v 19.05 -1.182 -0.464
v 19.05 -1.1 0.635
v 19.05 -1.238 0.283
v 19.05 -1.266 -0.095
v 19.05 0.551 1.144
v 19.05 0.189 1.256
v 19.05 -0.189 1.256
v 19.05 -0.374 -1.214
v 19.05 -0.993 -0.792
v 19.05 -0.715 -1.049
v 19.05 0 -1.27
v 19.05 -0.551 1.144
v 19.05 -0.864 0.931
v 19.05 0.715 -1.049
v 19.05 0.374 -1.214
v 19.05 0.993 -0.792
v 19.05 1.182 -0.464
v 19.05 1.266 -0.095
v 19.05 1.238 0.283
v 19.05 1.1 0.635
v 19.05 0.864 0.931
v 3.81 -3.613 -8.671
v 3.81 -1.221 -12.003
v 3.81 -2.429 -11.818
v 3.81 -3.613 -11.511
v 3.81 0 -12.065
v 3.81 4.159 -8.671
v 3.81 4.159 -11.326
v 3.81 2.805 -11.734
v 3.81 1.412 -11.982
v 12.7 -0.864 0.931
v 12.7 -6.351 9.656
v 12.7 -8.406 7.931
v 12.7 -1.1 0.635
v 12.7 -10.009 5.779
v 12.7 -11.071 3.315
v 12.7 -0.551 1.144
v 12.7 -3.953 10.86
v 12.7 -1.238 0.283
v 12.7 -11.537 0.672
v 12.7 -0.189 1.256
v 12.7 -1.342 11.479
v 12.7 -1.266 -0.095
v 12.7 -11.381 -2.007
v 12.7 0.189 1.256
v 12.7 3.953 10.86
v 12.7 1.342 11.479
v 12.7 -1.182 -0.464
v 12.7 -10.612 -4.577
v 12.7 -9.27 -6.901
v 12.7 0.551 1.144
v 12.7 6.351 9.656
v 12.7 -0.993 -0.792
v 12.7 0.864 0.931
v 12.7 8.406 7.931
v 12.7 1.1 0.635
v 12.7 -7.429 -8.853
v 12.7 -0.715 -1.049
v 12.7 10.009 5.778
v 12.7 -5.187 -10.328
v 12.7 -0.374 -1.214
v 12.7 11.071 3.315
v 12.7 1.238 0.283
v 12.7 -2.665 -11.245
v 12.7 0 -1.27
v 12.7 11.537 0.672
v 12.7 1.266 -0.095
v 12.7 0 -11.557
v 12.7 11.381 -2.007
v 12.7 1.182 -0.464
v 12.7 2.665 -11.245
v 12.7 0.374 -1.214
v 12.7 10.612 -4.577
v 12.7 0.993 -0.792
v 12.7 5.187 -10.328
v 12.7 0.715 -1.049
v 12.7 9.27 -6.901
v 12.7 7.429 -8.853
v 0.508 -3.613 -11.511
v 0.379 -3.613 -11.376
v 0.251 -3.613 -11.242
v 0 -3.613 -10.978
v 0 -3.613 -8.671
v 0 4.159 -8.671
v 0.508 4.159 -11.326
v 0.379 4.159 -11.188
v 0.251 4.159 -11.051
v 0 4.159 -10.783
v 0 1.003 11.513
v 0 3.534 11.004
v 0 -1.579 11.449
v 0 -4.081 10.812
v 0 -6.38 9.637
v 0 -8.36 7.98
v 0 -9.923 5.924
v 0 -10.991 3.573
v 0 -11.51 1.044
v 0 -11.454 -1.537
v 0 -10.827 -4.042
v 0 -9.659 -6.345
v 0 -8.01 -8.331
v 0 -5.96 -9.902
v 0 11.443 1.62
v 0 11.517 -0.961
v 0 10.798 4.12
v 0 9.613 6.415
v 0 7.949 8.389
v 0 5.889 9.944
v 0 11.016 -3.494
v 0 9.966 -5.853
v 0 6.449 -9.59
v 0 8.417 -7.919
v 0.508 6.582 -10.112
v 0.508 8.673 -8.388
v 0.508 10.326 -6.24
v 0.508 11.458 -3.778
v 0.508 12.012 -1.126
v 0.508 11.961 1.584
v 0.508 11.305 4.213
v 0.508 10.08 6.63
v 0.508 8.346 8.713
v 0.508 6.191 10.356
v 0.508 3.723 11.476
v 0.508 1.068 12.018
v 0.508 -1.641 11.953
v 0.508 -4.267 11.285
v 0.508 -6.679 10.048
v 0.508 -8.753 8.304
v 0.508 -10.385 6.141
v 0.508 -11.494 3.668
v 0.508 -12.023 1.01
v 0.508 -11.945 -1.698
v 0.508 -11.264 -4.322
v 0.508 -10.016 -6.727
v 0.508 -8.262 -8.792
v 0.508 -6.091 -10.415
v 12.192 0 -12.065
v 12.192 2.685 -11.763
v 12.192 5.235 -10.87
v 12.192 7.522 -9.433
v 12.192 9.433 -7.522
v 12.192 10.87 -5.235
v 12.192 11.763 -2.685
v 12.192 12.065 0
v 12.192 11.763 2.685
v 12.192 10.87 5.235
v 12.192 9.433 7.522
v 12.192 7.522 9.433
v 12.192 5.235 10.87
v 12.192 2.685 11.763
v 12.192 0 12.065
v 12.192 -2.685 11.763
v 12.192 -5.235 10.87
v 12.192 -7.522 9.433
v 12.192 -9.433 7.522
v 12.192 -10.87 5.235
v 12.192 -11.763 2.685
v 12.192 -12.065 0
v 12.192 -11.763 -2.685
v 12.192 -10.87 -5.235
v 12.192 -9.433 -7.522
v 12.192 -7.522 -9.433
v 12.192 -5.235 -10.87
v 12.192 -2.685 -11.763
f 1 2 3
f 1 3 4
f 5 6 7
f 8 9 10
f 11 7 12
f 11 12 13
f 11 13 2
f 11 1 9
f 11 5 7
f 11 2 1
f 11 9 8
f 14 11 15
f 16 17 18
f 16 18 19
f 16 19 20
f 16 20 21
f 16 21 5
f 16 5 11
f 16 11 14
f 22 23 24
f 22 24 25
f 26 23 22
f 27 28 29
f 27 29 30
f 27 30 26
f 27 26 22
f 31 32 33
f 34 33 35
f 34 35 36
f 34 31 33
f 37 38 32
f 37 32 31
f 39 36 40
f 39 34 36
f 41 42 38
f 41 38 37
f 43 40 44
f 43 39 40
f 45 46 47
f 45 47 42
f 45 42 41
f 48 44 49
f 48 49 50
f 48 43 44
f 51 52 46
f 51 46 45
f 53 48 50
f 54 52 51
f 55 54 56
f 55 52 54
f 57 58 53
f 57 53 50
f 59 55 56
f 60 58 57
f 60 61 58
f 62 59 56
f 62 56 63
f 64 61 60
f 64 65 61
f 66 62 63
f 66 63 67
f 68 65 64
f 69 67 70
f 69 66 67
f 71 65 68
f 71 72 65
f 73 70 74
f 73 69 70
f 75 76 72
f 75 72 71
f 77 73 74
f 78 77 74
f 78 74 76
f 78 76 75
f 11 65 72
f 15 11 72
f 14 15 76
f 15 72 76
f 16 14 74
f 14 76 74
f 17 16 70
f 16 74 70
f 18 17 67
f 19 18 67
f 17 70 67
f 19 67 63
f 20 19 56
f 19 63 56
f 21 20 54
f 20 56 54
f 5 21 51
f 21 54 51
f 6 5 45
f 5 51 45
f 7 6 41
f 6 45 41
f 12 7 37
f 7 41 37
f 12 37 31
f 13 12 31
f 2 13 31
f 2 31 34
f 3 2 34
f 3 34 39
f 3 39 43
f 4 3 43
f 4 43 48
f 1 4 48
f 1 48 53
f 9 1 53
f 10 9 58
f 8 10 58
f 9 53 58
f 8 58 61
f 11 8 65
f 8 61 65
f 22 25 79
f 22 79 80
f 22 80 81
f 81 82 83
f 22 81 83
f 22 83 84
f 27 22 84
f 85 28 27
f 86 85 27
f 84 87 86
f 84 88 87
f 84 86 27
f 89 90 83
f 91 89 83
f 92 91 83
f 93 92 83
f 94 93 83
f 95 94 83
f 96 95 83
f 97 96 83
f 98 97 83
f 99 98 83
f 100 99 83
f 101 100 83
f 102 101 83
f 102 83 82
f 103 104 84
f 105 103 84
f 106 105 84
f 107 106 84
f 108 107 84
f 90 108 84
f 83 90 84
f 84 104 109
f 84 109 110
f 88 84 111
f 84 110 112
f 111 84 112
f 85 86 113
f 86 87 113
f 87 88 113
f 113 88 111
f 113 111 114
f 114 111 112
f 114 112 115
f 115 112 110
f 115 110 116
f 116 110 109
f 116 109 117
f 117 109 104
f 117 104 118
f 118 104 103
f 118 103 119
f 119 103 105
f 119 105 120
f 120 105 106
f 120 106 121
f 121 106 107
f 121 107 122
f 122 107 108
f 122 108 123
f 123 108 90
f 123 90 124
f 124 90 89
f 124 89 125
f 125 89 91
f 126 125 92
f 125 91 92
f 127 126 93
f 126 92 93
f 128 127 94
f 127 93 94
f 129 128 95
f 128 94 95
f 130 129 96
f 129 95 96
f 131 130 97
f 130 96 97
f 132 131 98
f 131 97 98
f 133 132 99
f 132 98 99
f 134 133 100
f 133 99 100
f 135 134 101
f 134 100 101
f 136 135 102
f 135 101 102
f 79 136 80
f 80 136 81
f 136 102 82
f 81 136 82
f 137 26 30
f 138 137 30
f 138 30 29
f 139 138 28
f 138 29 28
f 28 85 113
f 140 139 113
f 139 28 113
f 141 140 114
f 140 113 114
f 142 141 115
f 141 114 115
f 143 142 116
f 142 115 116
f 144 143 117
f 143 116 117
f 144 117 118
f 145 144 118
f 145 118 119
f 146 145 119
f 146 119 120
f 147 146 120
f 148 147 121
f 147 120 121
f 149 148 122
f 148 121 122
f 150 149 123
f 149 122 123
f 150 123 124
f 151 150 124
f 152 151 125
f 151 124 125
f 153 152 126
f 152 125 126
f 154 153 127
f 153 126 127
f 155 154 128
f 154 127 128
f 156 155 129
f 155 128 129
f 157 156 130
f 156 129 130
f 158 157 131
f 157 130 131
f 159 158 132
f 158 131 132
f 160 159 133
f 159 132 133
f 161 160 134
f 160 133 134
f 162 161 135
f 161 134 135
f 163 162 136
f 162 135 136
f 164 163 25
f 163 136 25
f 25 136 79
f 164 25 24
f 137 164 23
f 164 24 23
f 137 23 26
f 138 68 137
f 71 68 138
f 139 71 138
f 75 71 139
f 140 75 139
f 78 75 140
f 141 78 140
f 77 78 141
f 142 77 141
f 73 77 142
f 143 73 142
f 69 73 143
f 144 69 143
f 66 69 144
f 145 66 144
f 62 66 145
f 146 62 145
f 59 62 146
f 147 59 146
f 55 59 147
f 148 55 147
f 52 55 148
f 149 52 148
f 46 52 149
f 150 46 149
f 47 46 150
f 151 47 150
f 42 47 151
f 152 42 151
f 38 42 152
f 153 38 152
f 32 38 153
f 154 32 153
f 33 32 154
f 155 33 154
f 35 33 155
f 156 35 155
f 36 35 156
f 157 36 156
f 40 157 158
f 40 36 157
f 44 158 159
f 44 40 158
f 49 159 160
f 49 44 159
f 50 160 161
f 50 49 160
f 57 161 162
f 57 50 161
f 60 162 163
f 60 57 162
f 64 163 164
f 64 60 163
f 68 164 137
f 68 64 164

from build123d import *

# Parameters (mm, degrees)
SKETCH1_R           = 12.065
BOSS_EXTRUDE1_DEPTH = 12.7
SKETCH2_R           = 1.27
BOSS_EXTRUDE2_DEPTH = 6.35
SKETCH4_W           = 5.04217838
SKETCH4_H           = 7.772020178
CUT_EXTRUDE1_DEPTH  = 3.81
CHAMFER1_SIZE       = 0.508


with BuildPart() as part:
    # Sketch1 → Boss-Extrude1 (new body)
    with BuildSketch(Plane(origin=(0, 0, 0), x_dir=(0, 0, -1), z_dir=(1, 0, 0))):
        Circle(SKETCH1_R)
    extrude(amount=BOSS_EXTRUDE1_DEPTH)

    # Sketch2 → Boss-Extrude2 (add)
    with BuildSketch(Plane(origin=(12.7, 0, 0), x_dir=(0, 0, -1), z_dir=(1, 0, 0))):
        Circle(SKETCH2_R)
    extrude(amount=BOSS_EXTRUDE2_DEPTH)

    # Sketch4 → Cut-Extrude1 (cut)
    with BuildSketch(Plane.ZY):
        with Locations((-11.192351372, 0.27298418)):
            Rectangle(SKETCH4_W, SKETCH4_H)
    extrude(amount=-CUT_EXTRUDE1_DEPTH, mode=Mode.SUBTRACT)

    # Chamfer1
    chamfer1_edges = [part.edges().sort_by_distance(p)[0] for p in [
        (0, -0.288360149, 12.061553525),
        (12.7, 0, 12.065),
    ]]
    chamfer(chamfer1_edges, length=CHAMFER1_SIZE)


solid = part.part
